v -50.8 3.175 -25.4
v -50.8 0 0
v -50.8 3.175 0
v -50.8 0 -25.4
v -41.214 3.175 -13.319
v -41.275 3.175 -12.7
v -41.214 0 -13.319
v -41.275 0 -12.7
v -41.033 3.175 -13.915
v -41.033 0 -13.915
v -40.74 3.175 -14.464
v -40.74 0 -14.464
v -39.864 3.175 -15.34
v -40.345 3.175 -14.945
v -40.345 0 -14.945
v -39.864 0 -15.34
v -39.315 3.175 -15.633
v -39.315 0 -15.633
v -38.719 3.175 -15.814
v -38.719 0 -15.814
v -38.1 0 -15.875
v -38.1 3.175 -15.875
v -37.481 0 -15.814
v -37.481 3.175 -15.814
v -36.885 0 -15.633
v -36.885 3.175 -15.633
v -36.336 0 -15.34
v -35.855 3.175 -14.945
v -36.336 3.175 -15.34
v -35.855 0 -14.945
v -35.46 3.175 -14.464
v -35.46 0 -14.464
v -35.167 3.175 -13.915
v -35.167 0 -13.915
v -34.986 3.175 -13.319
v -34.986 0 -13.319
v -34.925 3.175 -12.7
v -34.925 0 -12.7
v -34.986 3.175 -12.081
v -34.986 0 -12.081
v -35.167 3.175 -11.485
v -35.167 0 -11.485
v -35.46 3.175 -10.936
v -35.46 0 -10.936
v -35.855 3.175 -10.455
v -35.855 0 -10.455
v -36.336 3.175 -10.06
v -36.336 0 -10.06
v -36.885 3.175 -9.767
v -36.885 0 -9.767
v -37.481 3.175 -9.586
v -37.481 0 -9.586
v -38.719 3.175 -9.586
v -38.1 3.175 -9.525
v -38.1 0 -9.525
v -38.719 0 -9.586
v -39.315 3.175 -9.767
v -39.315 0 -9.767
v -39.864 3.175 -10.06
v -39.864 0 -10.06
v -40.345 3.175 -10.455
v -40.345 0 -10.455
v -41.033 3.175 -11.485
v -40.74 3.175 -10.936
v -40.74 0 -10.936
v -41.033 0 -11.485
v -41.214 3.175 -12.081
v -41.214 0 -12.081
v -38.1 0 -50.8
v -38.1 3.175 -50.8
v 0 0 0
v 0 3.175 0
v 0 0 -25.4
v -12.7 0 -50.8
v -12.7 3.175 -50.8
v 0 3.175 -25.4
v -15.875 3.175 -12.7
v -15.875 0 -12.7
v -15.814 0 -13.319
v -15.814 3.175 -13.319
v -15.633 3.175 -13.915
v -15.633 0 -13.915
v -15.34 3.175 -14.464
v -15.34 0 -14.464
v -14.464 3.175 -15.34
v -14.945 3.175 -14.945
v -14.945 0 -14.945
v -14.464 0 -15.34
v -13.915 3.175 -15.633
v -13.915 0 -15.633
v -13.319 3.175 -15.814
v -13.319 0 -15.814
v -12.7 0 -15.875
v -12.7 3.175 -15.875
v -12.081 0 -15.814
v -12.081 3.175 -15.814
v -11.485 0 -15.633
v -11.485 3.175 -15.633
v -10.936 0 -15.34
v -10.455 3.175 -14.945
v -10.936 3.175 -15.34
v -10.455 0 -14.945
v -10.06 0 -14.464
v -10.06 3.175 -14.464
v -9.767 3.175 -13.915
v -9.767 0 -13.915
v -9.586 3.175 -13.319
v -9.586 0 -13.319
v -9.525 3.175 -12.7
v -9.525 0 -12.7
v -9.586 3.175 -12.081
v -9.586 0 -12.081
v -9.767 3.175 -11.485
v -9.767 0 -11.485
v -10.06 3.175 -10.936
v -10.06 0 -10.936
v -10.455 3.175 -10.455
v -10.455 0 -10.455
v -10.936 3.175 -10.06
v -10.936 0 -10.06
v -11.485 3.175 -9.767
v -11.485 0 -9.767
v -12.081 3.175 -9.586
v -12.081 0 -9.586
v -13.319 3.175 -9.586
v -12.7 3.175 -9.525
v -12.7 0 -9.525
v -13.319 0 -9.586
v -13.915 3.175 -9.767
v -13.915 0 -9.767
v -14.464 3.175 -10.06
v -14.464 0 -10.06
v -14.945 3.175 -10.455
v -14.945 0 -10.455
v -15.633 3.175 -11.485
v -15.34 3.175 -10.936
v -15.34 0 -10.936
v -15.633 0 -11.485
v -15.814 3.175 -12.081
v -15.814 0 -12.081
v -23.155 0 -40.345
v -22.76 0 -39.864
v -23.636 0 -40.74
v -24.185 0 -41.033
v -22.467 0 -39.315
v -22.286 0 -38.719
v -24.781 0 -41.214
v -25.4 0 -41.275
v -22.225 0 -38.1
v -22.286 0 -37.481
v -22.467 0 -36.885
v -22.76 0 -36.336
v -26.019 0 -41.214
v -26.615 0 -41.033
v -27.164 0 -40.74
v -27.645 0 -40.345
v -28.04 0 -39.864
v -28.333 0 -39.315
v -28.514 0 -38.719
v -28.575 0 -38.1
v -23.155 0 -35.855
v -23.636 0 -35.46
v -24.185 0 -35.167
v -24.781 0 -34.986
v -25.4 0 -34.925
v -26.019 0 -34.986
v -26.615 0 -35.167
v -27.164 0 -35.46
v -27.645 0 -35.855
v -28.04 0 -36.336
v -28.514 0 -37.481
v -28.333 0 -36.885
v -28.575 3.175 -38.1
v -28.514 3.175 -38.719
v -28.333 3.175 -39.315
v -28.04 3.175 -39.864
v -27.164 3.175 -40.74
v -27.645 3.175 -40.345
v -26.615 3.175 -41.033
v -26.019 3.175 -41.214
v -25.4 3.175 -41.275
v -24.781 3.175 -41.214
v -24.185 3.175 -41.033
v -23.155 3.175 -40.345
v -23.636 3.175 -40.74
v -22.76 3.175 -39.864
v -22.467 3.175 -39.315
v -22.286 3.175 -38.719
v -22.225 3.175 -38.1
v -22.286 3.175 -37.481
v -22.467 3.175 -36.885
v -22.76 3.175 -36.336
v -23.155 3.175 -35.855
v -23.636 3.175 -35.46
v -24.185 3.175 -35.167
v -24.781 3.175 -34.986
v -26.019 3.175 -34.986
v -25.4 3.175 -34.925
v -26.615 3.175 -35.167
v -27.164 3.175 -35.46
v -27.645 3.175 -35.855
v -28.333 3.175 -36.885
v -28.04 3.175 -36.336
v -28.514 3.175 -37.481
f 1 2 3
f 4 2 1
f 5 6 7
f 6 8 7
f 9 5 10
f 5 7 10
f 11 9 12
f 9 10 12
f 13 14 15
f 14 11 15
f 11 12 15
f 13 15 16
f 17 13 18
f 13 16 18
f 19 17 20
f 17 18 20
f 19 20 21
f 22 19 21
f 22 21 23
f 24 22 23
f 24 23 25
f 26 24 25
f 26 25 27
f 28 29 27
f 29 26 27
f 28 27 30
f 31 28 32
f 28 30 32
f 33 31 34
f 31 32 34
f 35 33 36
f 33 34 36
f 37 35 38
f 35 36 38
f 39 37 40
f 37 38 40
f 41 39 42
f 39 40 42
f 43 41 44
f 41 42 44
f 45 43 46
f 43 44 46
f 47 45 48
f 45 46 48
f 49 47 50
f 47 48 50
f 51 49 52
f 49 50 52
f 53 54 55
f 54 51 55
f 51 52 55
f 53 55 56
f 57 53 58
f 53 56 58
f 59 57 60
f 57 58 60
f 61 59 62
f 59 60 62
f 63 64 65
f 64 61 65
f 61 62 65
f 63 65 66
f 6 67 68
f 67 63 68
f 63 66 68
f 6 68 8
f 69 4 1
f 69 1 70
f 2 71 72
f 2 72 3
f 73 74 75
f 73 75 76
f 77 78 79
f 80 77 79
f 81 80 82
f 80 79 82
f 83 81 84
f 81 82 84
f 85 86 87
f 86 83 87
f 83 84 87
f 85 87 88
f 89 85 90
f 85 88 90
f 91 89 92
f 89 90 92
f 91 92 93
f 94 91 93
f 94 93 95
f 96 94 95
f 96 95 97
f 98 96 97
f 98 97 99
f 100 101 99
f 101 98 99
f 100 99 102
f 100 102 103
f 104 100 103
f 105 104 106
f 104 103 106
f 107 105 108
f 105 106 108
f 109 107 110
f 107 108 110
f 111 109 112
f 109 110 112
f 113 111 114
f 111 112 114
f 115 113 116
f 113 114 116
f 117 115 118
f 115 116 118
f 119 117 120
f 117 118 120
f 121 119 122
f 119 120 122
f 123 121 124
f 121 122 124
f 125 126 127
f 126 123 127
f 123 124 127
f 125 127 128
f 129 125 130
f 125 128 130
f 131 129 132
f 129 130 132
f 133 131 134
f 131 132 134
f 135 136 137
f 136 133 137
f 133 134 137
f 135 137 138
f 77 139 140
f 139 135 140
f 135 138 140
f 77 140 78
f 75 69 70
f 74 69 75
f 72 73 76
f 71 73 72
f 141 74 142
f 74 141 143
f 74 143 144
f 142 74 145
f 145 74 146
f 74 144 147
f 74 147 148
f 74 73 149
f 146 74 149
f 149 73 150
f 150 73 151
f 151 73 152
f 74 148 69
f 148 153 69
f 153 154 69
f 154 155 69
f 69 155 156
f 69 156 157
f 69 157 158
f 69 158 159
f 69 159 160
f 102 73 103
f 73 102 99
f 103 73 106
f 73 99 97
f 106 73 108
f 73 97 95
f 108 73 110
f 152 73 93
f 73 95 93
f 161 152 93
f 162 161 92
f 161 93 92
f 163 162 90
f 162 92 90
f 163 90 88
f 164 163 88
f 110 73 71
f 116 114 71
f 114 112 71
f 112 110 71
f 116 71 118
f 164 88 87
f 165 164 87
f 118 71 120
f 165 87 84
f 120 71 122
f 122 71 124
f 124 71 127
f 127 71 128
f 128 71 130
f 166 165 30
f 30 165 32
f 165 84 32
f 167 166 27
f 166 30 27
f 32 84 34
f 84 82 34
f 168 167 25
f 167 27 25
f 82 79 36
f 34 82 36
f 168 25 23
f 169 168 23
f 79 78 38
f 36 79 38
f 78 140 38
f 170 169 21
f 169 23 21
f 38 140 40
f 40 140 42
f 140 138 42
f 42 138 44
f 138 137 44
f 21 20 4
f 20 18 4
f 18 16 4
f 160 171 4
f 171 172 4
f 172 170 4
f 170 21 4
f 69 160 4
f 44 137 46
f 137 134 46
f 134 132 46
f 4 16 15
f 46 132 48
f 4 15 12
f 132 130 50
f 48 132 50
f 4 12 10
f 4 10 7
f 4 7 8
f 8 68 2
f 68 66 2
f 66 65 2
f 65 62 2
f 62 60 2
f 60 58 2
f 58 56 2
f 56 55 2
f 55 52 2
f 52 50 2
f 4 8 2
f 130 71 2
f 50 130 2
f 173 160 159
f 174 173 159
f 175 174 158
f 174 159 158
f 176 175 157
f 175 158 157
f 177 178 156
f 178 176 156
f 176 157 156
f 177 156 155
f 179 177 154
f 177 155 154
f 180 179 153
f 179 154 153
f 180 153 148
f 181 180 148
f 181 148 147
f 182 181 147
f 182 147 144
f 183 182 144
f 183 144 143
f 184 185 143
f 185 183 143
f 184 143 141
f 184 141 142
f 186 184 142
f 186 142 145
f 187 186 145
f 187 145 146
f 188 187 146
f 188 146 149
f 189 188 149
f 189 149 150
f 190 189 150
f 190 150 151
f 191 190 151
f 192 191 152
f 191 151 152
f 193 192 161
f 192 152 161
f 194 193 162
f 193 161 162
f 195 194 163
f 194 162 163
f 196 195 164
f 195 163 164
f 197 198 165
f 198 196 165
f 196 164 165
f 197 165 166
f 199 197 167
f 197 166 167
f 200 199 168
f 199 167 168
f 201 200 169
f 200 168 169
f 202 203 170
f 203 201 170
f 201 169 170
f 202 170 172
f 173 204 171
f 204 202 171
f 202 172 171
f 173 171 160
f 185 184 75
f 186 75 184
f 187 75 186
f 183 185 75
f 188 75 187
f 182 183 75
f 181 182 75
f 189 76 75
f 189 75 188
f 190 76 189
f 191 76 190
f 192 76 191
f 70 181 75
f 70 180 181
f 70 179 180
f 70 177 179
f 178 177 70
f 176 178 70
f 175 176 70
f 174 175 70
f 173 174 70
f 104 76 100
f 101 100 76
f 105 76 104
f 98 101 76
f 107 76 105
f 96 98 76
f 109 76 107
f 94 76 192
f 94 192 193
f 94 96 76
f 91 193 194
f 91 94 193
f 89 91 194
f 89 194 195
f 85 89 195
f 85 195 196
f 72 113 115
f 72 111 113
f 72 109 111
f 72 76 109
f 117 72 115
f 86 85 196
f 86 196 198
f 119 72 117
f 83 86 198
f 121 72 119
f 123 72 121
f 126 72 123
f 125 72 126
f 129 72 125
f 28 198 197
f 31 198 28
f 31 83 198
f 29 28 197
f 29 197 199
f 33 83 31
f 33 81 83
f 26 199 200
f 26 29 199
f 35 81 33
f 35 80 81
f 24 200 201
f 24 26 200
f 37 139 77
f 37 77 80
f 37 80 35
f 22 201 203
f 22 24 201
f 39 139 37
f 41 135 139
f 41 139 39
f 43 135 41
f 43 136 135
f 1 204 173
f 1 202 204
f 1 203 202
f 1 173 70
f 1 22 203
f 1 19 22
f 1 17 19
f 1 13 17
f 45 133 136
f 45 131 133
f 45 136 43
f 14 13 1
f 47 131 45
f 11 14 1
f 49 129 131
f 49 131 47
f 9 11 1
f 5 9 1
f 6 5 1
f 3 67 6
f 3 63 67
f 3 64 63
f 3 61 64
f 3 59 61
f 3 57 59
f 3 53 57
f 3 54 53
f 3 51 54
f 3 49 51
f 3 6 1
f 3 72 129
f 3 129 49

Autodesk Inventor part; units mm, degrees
ref_plane "YZ Plane" through (0, 0, 0) normal (1, 0, 0) x (0, 1, 0)
ref_plane "XZ Plane" through (0, 0, 0) normal (0, 1, 0) x (-1, 0, 0)
ref_plane "XY Plane" through (0, 0, 0) normal (0, 0, 1) x (1, 0, 0)
sketch "Sketch1" plane through (0, 0, 0) normal (0, 1, 0) x (-1, 0, 0)
  line L0 (0, 0) -> (50.8, 0)
  line L1 (50.8, 0) -> (50.8, -25.4)
  line L2 (50.8, -25.4) -> (38.1, -50.8)
  line L3 (38.1, -50.8) -> (12.7, -50.8)
  line L4 (12.7, -50.8) -> (0, -25.4)
  line L5 (0, -25.4) -> (0, 0)
  circle A0 centre (12.7, -12.7) radius 3.175
  circle A1 centre (38.1, -12.7) radius 3.175
  circle A2 centre (25.4, -38.1) radius 3.175
  dimension "d0" = 25.4
  dimension "d1" = 50.8
  dimension "d2" = 25.4
  dimension "d3" = 50.8
  dimension "d4" = 12.7
  dimension "d5" = 6.35
  dimension "d6" = 6.35
  dimension "d7" = 12.7
  dimension "d8" = 12.7
  dimension "d9" = 12.7
  dimension "d10" = 12.7
  dimension "d11" = 6.35
  dimension "d12" = 12.7
  dimension "d13" = 12.7
extrude "Extrusion1" add sketch "Sketch1" along normal blind 3.175
properties part number "15102898-16-P-0212" material "Aluminum 6061"
